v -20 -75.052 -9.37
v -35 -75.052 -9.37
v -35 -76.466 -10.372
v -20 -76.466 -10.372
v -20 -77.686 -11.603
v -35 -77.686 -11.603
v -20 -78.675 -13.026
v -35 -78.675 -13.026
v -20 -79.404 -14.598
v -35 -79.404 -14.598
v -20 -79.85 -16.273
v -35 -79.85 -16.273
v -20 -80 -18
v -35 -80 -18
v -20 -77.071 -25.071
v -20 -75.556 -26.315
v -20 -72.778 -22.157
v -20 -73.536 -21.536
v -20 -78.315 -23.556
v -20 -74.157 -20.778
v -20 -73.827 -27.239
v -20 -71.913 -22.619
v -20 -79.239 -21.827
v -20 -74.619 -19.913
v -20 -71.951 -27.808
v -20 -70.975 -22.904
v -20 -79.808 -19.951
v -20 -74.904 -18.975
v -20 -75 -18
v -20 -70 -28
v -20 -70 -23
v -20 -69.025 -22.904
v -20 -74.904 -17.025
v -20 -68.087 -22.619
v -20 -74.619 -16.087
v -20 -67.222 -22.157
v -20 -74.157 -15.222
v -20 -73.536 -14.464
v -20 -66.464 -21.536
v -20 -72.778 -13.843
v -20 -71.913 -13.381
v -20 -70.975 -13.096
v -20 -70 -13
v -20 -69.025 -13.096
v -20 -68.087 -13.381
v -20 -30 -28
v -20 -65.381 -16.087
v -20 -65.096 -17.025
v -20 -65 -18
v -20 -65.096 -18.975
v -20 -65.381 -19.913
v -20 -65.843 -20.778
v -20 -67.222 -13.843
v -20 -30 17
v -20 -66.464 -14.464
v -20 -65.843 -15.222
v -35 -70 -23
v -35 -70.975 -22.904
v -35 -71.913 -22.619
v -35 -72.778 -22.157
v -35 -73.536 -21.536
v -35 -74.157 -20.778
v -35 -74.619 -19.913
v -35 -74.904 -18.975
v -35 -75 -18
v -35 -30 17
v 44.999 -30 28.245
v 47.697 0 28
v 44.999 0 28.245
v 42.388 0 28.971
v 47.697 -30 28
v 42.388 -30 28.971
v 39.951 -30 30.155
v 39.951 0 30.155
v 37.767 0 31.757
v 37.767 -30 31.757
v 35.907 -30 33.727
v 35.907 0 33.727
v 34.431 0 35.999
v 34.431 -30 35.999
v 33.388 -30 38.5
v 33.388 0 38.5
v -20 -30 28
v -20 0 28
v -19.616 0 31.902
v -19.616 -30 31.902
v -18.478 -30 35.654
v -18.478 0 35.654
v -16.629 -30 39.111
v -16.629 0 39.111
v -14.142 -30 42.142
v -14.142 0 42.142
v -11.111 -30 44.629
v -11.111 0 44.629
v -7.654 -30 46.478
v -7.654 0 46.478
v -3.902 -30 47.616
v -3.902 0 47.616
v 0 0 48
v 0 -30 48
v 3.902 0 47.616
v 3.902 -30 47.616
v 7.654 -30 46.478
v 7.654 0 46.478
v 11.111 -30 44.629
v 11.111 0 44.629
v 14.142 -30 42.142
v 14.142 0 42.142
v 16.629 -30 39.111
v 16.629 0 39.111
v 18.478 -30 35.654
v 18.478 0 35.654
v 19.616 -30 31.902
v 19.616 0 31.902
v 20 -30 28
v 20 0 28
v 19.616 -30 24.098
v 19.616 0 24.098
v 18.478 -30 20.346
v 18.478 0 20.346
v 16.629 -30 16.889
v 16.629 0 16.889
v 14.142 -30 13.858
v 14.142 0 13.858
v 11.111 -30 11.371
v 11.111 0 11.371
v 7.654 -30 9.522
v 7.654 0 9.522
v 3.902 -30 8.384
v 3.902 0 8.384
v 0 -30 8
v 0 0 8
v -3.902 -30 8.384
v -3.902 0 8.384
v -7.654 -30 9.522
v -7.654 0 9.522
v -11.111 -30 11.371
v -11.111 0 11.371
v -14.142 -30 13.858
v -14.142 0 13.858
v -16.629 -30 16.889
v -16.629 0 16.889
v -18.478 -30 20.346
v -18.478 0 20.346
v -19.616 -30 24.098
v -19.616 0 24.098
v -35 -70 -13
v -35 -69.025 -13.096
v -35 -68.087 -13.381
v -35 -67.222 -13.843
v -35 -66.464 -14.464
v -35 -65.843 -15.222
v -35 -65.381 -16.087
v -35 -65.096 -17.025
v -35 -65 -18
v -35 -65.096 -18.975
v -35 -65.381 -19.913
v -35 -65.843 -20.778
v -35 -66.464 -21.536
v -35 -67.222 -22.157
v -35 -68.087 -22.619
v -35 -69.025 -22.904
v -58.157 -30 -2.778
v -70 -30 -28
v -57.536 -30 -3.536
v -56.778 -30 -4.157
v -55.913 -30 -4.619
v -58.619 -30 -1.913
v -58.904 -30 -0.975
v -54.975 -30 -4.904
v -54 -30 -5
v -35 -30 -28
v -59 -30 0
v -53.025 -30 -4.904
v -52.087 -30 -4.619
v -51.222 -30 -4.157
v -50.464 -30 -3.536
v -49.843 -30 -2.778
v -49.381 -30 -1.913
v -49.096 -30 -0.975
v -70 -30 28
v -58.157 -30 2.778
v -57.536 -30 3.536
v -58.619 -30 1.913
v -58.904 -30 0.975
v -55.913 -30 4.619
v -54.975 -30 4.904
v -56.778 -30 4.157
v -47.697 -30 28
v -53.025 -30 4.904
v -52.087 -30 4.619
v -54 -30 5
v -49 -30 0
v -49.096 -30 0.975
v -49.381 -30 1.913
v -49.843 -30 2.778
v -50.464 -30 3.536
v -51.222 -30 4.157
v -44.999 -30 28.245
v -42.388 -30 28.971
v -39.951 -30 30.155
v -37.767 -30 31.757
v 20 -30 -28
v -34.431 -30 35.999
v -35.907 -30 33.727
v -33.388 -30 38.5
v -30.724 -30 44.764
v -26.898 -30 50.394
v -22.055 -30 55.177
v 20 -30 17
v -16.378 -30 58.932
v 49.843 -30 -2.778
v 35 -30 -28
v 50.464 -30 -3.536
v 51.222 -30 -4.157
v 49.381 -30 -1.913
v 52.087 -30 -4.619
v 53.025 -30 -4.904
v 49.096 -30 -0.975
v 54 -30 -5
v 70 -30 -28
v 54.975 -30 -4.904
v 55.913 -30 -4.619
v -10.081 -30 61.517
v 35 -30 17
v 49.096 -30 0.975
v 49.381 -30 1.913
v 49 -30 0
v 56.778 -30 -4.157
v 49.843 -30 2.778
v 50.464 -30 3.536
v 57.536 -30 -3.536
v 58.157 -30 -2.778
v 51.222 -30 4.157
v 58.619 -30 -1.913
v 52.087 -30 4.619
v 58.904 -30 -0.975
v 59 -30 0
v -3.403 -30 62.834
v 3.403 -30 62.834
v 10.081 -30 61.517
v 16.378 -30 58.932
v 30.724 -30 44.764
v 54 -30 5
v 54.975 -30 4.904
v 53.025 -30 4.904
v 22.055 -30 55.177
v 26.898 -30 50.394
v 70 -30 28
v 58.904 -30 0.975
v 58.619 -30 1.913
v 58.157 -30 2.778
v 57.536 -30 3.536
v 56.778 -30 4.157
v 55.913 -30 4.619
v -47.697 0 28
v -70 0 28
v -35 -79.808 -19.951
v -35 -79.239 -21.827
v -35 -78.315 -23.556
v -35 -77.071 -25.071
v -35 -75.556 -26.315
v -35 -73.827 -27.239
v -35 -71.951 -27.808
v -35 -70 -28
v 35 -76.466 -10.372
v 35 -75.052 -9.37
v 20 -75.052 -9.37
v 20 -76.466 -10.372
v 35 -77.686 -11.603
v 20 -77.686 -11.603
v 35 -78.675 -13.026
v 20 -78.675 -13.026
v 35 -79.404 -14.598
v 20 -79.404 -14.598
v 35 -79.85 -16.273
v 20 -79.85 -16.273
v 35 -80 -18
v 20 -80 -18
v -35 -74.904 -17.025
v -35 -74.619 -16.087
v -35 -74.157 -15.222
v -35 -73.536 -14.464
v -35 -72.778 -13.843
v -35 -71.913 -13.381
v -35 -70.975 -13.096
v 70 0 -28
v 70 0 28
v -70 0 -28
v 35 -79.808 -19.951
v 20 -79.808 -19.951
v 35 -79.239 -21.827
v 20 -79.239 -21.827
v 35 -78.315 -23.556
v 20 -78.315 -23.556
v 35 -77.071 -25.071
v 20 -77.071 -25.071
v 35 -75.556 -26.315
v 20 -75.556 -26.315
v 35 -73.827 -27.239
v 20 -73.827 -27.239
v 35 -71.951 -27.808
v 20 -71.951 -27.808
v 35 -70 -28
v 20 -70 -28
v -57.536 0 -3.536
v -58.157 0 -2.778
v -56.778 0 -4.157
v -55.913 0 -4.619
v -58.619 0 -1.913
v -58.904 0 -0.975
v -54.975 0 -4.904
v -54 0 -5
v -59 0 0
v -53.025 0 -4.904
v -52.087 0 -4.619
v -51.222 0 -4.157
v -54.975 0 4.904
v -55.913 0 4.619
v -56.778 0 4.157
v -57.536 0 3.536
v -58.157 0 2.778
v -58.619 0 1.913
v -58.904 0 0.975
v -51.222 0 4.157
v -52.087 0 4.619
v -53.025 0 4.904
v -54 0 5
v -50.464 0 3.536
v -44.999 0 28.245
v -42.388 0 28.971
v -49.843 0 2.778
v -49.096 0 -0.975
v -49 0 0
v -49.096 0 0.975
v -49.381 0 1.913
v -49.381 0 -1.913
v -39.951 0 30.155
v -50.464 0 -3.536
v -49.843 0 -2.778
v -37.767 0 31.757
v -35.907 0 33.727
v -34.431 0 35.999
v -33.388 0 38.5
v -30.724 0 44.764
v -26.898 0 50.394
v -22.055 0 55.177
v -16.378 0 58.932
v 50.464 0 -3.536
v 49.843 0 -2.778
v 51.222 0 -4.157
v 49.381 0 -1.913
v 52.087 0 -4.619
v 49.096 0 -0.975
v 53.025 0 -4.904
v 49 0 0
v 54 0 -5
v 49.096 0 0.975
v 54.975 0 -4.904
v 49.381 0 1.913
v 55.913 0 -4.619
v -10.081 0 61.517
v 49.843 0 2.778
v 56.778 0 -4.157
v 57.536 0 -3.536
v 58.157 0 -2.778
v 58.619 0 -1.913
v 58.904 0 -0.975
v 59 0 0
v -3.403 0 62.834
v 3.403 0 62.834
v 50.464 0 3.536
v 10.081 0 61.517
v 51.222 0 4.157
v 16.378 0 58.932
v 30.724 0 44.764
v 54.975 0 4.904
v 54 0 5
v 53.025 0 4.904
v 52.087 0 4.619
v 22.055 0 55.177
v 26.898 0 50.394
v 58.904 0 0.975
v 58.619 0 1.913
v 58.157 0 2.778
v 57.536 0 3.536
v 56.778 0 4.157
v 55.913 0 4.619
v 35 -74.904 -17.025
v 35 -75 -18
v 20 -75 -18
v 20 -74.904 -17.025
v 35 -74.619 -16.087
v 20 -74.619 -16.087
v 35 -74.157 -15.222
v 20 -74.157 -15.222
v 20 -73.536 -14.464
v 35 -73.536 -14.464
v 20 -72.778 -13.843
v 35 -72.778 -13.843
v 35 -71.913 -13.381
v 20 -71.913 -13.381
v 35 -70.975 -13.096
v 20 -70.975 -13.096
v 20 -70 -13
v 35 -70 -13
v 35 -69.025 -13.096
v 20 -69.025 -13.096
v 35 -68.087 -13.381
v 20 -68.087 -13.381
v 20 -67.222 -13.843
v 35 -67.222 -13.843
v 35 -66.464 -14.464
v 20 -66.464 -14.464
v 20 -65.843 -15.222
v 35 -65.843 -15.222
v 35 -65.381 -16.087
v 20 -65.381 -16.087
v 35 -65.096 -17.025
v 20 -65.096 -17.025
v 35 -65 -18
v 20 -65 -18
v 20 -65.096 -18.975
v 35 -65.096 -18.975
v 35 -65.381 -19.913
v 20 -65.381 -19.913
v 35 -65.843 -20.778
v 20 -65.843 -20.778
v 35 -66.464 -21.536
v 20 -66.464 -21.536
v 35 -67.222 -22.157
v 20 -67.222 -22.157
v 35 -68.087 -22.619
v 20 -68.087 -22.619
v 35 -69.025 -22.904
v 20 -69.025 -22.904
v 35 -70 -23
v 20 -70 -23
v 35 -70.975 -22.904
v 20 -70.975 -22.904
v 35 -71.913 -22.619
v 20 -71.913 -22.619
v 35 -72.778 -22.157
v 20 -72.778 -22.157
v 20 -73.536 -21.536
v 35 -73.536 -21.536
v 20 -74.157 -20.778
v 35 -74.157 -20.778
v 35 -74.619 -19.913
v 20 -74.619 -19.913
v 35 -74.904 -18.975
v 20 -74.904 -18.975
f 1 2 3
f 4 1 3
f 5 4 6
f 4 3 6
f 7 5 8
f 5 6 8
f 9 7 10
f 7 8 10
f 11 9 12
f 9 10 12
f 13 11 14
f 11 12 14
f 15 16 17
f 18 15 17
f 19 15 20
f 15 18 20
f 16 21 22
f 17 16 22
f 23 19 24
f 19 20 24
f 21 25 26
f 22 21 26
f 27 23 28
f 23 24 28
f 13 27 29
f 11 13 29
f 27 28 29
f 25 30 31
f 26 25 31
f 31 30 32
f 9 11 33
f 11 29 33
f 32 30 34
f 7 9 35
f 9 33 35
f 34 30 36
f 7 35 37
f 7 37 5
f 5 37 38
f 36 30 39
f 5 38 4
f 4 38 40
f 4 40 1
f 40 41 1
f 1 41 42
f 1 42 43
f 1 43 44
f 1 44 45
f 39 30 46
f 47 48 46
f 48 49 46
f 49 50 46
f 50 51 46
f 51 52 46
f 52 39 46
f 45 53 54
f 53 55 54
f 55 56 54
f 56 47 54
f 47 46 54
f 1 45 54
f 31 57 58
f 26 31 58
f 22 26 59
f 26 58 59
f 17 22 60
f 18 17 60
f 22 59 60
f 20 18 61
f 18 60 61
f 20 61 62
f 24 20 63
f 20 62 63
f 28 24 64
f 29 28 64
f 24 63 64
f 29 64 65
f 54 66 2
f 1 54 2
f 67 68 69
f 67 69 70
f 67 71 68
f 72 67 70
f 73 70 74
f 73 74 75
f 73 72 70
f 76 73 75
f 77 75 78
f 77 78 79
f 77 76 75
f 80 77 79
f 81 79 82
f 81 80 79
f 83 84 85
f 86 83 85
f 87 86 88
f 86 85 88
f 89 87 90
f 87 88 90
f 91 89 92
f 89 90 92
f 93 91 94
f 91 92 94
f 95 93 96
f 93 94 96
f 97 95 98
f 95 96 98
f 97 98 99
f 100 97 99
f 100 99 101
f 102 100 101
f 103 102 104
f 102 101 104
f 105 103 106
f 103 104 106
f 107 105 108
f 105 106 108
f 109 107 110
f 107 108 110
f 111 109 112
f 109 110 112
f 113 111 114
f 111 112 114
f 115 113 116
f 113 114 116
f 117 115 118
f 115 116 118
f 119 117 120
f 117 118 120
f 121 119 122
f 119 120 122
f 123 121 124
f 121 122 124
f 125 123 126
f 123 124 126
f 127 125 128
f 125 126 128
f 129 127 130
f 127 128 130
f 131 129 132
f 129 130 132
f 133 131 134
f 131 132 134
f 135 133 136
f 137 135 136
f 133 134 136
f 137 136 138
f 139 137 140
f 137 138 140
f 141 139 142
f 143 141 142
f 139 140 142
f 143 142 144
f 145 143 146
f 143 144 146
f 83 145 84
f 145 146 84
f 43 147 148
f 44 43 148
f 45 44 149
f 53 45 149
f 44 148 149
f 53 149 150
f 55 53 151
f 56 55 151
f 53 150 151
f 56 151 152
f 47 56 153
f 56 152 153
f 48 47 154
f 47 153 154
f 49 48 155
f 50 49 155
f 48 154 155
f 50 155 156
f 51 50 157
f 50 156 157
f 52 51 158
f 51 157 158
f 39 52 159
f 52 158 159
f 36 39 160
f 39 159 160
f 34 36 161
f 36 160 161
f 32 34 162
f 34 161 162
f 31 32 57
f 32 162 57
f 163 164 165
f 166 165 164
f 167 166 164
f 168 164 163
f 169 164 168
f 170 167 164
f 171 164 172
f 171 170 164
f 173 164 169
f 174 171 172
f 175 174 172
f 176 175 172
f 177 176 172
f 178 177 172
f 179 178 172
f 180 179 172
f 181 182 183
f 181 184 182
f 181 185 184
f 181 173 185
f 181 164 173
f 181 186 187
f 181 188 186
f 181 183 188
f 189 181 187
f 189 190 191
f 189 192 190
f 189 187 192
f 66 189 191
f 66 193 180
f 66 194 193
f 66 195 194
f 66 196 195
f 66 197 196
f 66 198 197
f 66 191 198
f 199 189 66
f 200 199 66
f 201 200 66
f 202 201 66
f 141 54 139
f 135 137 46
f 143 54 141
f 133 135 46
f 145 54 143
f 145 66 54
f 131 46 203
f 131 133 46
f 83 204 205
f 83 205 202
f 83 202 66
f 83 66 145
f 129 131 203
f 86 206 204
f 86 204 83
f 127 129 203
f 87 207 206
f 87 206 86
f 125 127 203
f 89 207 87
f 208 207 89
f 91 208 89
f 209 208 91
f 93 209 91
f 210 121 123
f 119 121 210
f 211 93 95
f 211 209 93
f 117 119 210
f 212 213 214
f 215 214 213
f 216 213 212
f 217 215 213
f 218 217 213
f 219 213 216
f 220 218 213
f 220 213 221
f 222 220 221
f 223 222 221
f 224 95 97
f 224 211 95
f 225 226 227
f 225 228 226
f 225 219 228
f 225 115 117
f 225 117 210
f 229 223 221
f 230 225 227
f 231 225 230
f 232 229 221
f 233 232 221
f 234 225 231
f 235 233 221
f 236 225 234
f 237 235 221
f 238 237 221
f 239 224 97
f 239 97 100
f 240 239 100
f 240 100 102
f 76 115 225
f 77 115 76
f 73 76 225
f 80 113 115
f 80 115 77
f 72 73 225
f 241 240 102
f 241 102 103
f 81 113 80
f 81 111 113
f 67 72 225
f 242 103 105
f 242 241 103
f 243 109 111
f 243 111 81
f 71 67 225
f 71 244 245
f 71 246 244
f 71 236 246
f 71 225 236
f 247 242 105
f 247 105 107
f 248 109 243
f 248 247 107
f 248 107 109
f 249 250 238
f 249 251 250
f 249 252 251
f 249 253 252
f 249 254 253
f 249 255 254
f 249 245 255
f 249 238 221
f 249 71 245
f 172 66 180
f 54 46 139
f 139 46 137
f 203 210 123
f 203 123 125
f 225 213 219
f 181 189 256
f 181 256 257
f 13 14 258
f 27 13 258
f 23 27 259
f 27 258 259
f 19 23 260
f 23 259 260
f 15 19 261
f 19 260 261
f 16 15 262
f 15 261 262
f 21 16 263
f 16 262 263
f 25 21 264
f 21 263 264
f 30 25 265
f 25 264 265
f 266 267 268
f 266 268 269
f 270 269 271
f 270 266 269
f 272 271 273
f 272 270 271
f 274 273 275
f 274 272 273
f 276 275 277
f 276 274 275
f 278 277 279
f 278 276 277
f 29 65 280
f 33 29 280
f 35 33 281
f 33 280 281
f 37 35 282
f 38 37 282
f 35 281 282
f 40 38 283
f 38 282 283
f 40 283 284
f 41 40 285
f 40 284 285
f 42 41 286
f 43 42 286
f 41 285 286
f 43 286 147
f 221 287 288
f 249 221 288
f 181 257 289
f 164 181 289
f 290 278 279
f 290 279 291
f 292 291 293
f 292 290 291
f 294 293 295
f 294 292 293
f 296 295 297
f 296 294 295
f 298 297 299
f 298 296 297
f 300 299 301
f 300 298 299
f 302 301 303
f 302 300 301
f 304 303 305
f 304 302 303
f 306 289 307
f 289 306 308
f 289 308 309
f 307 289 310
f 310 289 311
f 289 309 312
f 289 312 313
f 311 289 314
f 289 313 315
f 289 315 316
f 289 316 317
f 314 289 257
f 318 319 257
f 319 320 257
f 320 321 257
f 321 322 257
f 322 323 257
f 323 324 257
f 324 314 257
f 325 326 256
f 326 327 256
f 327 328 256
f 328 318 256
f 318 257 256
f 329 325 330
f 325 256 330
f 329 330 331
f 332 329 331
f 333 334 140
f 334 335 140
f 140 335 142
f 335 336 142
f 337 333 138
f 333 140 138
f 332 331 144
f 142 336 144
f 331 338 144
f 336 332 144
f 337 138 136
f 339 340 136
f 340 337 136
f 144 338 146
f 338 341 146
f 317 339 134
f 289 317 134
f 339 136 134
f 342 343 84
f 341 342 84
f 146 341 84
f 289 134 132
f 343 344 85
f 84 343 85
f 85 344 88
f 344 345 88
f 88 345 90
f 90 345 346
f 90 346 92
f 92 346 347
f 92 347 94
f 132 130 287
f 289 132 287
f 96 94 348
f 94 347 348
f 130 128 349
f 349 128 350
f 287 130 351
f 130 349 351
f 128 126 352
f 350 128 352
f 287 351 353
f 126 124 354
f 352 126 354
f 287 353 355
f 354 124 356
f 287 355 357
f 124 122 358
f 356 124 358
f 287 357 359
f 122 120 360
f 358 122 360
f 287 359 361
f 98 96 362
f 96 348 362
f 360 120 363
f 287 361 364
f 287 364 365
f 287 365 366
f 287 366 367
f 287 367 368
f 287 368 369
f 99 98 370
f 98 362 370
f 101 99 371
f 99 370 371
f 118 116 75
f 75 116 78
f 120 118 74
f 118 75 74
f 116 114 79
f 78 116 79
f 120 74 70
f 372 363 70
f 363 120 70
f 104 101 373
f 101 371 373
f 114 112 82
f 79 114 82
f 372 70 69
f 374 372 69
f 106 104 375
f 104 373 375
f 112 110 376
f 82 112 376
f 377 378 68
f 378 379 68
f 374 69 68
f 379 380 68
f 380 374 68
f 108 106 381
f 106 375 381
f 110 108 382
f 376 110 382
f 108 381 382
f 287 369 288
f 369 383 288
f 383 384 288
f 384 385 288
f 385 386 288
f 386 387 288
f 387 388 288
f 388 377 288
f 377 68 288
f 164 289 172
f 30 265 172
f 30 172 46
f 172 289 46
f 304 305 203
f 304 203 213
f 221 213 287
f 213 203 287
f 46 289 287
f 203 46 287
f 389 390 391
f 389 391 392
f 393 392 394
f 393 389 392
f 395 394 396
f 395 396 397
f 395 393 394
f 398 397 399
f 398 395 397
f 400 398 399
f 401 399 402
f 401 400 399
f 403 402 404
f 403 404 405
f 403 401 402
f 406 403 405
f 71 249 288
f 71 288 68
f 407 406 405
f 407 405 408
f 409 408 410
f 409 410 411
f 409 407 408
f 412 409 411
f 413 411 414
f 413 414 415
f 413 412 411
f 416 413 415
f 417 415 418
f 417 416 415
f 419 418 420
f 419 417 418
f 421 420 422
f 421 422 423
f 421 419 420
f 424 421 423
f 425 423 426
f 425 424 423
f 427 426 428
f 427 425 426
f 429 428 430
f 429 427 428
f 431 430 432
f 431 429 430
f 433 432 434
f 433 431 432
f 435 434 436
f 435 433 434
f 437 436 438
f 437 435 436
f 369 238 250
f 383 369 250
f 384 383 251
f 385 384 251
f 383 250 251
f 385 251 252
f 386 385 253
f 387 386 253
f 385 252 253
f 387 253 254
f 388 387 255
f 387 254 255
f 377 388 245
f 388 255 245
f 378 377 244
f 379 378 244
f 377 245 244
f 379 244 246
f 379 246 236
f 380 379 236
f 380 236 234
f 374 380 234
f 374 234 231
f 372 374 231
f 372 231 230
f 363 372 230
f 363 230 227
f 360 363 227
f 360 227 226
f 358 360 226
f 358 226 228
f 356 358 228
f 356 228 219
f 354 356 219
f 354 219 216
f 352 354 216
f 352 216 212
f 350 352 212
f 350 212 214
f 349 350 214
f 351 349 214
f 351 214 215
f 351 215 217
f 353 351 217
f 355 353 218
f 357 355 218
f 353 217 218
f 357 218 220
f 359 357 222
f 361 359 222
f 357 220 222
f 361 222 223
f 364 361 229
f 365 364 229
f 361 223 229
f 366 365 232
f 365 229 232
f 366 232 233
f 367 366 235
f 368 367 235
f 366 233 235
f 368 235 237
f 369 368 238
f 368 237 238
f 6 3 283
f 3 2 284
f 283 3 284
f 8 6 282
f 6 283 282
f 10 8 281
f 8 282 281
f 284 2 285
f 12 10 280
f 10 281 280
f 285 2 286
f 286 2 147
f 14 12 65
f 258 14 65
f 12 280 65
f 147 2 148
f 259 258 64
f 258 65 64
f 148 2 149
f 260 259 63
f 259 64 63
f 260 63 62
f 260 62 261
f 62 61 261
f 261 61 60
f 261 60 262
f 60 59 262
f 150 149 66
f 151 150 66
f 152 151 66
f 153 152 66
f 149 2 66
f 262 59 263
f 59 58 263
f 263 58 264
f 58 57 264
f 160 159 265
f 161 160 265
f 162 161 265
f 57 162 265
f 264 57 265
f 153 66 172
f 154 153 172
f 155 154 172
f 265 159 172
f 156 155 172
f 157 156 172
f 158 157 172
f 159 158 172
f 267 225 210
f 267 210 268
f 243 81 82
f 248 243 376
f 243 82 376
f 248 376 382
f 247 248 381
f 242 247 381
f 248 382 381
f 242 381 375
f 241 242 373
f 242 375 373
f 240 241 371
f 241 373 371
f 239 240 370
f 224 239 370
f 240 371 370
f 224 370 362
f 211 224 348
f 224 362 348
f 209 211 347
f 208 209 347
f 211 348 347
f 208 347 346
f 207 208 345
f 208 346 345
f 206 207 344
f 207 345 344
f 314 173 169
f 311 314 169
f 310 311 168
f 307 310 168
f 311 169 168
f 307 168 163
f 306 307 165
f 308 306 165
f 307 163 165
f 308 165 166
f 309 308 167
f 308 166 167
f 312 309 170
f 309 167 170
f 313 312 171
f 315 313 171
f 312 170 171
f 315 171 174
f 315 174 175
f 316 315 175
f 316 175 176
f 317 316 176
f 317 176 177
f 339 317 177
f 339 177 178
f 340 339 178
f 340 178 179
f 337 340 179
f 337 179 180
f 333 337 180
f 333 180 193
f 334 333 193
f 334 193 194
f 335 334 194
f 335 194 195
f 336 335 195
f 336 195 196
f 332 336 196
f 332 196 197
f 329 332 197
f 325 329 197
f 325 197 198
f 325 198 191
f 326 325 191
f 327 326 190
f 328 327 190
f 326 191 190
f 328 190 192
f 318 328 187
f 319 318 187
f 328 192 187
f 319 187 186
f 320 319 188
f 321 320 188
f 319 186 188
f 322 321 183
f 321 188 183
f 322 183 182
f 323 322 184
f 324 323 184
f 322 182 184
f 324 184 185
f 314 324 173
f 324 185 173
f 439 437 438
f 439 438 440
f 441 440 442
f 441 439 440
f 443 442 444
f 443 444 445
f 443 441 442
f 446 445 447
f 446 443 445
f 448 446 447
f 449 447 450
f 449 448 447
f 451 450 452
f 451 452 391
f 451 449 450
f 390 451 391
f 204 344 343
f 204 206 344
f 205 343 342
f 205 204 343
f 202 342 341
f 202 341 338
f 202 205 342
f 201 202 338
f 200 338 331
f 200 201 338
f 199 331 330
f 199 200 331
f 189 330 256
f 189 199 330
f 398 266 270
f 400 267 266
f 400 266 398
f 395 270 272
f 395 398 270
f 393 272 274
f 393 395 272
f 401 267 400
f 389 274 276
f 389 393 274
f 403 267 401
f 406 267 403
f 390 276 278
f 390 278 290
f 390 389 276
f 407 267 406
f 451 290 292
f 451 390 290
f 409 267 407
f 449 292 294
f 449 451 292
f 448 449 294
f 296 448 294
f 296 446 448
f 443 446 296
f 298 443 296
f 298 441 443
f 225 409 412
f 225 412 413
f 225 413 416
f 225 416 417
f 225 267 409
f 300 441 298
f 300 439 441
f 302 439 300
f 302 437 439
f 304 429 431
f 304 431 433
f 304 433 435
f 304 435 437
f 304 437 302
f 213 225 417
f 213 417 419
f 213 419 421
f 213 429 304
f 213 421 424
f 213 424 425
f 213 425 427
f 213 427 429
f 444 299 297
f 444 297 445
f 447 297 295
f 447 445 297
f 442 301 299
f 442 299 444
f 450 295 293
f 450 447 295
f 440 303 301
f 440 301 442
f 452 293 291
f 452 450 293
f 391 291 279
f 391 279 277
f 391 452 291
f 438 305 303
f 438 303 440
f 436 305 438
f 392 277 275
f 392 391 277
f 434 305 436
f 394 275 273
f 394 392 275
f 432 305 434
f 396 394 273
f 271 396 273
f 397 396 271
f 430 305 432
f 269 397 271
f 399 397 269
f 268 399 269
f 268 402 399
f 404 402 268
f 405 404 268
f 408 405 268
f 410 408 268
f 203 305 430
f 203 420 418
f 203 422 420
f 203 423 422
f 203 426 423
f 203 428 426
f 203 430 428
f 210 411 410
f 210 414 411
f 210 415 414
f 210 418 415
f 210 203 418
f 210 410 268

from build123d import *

# Parameters (mm, degrees)
F1_DEPTH = 30
F2_R     = 15
F3_R     = 5
F4_DEPTH = 72
F6_DEPTH = 60
F8_DEPTH = 51.3


with BuildPart() as f1:
    # F0 (on Front) → F1 (new body)
    with BuildSketch(Plane.XZ):
        with BuildLine():
            Line((70, -28), (70, 28))
            Line((70, 28), (35, 28))
            ThreePointArc((35, 28), (0, -7), (-35, 28))
            Line((-35, 28), (-70, 28))
            Line((-70, 28), (-70, -28))
            Line((-70, -28), (70, -28))
        make_face()
        with BuildLine():
            ThreePointArc((-35, 28), (0, -7), (35, 28))
            Line((35, 28), (20, 28))
            ThreePointArc((20, 28), (0, 8), (-20, 28))
            Line((-20, 28), (-35, 28))
        make_face()
        with BuildLine():
            Line((20, 28), (35, 28))
            ThreePointArc((35, 28), (0, 63), (-35, 28))
            Line((-35, 28), (-20, 28))
            ThreePointArc((-20, 28), (0, 48), (20, 28))
        make_face()
    extrude(amount=F1_DEPTH)

    # F2
    f2_edges = [f1.edges().sort_by_distance(p)[0] for p in [
        (-35, -15, 28),
        (35, -15, 28),
    ]]
    fillet(f2_edges, radius=F2_R)

    # F3 (on face) → F4 (cut)
    with BuildSketch(Plane.XZ.offset(30)):
        with BuildLine():
            ThreePointArc((-49, 0), (-54, 5), (-59, 0))
            ThreePointArc((-59, 0), (-54, -5), (-49, 0))
        make_face()
        with Locations((54, 0)):
            Circle(F3_R)
    extrude(amount=-F4_DEPTH, mode=Mode.SUBTRACT)

    # F5 (on face) → F6 (join)
    with BuildSketch(Plane.XZ.offset(30)):
        Polygon((-35, 17), (-35, 0), (-35, -28), (-20, -28), (-20, 17), align=None)
    extrude(amount=F6_DEPTH)

    # F7 (on face) → F8 (cut)
    with BuildSketch(Plane(origin=(-35, 0, 0), x_dir=(0, -1, 0), z_dir=(-1, 0, 0))):
        with BuildLine():
            Line((90, 17), (30, 17))
            Line((30, 17), (75.0515173064, -9.369694507))
            ThreePointArc((75.0515173064, -9.369694507), (78.6751130559, -13.0258253481), (80, -18))
            ThreePointArc((80, -18), (77.0710678119, -25.0710678119), (70, -28))
            Line((70, -28), (90, -28))
            Line((90, -28), (90, 17))
        make_face()
        with BuildLine():
            ThreePointArc((70, -13), (65, -18), (70, -23))
            Line((70, -23), (70, -13))
        make_face()
        with BuildLine():
            Line((70, -13), (70, -23))
            ThreePointArc((70, -23), (73.5355339059, -21.5355339059), (75, -18))
            ThreePointArc((75, -18), (73.5355339059, -14.4644660941), (70, -13))
        make_face()
    extrude(amount=-F8_DEPTH, mode=Mode.SUBTRACT)

    # F9: F1 across plane


with BuildPart() as f1_1:
    add(f1.part)
    add(f1.part.mirror(Plane.YZ))


solid = f1_1.part
